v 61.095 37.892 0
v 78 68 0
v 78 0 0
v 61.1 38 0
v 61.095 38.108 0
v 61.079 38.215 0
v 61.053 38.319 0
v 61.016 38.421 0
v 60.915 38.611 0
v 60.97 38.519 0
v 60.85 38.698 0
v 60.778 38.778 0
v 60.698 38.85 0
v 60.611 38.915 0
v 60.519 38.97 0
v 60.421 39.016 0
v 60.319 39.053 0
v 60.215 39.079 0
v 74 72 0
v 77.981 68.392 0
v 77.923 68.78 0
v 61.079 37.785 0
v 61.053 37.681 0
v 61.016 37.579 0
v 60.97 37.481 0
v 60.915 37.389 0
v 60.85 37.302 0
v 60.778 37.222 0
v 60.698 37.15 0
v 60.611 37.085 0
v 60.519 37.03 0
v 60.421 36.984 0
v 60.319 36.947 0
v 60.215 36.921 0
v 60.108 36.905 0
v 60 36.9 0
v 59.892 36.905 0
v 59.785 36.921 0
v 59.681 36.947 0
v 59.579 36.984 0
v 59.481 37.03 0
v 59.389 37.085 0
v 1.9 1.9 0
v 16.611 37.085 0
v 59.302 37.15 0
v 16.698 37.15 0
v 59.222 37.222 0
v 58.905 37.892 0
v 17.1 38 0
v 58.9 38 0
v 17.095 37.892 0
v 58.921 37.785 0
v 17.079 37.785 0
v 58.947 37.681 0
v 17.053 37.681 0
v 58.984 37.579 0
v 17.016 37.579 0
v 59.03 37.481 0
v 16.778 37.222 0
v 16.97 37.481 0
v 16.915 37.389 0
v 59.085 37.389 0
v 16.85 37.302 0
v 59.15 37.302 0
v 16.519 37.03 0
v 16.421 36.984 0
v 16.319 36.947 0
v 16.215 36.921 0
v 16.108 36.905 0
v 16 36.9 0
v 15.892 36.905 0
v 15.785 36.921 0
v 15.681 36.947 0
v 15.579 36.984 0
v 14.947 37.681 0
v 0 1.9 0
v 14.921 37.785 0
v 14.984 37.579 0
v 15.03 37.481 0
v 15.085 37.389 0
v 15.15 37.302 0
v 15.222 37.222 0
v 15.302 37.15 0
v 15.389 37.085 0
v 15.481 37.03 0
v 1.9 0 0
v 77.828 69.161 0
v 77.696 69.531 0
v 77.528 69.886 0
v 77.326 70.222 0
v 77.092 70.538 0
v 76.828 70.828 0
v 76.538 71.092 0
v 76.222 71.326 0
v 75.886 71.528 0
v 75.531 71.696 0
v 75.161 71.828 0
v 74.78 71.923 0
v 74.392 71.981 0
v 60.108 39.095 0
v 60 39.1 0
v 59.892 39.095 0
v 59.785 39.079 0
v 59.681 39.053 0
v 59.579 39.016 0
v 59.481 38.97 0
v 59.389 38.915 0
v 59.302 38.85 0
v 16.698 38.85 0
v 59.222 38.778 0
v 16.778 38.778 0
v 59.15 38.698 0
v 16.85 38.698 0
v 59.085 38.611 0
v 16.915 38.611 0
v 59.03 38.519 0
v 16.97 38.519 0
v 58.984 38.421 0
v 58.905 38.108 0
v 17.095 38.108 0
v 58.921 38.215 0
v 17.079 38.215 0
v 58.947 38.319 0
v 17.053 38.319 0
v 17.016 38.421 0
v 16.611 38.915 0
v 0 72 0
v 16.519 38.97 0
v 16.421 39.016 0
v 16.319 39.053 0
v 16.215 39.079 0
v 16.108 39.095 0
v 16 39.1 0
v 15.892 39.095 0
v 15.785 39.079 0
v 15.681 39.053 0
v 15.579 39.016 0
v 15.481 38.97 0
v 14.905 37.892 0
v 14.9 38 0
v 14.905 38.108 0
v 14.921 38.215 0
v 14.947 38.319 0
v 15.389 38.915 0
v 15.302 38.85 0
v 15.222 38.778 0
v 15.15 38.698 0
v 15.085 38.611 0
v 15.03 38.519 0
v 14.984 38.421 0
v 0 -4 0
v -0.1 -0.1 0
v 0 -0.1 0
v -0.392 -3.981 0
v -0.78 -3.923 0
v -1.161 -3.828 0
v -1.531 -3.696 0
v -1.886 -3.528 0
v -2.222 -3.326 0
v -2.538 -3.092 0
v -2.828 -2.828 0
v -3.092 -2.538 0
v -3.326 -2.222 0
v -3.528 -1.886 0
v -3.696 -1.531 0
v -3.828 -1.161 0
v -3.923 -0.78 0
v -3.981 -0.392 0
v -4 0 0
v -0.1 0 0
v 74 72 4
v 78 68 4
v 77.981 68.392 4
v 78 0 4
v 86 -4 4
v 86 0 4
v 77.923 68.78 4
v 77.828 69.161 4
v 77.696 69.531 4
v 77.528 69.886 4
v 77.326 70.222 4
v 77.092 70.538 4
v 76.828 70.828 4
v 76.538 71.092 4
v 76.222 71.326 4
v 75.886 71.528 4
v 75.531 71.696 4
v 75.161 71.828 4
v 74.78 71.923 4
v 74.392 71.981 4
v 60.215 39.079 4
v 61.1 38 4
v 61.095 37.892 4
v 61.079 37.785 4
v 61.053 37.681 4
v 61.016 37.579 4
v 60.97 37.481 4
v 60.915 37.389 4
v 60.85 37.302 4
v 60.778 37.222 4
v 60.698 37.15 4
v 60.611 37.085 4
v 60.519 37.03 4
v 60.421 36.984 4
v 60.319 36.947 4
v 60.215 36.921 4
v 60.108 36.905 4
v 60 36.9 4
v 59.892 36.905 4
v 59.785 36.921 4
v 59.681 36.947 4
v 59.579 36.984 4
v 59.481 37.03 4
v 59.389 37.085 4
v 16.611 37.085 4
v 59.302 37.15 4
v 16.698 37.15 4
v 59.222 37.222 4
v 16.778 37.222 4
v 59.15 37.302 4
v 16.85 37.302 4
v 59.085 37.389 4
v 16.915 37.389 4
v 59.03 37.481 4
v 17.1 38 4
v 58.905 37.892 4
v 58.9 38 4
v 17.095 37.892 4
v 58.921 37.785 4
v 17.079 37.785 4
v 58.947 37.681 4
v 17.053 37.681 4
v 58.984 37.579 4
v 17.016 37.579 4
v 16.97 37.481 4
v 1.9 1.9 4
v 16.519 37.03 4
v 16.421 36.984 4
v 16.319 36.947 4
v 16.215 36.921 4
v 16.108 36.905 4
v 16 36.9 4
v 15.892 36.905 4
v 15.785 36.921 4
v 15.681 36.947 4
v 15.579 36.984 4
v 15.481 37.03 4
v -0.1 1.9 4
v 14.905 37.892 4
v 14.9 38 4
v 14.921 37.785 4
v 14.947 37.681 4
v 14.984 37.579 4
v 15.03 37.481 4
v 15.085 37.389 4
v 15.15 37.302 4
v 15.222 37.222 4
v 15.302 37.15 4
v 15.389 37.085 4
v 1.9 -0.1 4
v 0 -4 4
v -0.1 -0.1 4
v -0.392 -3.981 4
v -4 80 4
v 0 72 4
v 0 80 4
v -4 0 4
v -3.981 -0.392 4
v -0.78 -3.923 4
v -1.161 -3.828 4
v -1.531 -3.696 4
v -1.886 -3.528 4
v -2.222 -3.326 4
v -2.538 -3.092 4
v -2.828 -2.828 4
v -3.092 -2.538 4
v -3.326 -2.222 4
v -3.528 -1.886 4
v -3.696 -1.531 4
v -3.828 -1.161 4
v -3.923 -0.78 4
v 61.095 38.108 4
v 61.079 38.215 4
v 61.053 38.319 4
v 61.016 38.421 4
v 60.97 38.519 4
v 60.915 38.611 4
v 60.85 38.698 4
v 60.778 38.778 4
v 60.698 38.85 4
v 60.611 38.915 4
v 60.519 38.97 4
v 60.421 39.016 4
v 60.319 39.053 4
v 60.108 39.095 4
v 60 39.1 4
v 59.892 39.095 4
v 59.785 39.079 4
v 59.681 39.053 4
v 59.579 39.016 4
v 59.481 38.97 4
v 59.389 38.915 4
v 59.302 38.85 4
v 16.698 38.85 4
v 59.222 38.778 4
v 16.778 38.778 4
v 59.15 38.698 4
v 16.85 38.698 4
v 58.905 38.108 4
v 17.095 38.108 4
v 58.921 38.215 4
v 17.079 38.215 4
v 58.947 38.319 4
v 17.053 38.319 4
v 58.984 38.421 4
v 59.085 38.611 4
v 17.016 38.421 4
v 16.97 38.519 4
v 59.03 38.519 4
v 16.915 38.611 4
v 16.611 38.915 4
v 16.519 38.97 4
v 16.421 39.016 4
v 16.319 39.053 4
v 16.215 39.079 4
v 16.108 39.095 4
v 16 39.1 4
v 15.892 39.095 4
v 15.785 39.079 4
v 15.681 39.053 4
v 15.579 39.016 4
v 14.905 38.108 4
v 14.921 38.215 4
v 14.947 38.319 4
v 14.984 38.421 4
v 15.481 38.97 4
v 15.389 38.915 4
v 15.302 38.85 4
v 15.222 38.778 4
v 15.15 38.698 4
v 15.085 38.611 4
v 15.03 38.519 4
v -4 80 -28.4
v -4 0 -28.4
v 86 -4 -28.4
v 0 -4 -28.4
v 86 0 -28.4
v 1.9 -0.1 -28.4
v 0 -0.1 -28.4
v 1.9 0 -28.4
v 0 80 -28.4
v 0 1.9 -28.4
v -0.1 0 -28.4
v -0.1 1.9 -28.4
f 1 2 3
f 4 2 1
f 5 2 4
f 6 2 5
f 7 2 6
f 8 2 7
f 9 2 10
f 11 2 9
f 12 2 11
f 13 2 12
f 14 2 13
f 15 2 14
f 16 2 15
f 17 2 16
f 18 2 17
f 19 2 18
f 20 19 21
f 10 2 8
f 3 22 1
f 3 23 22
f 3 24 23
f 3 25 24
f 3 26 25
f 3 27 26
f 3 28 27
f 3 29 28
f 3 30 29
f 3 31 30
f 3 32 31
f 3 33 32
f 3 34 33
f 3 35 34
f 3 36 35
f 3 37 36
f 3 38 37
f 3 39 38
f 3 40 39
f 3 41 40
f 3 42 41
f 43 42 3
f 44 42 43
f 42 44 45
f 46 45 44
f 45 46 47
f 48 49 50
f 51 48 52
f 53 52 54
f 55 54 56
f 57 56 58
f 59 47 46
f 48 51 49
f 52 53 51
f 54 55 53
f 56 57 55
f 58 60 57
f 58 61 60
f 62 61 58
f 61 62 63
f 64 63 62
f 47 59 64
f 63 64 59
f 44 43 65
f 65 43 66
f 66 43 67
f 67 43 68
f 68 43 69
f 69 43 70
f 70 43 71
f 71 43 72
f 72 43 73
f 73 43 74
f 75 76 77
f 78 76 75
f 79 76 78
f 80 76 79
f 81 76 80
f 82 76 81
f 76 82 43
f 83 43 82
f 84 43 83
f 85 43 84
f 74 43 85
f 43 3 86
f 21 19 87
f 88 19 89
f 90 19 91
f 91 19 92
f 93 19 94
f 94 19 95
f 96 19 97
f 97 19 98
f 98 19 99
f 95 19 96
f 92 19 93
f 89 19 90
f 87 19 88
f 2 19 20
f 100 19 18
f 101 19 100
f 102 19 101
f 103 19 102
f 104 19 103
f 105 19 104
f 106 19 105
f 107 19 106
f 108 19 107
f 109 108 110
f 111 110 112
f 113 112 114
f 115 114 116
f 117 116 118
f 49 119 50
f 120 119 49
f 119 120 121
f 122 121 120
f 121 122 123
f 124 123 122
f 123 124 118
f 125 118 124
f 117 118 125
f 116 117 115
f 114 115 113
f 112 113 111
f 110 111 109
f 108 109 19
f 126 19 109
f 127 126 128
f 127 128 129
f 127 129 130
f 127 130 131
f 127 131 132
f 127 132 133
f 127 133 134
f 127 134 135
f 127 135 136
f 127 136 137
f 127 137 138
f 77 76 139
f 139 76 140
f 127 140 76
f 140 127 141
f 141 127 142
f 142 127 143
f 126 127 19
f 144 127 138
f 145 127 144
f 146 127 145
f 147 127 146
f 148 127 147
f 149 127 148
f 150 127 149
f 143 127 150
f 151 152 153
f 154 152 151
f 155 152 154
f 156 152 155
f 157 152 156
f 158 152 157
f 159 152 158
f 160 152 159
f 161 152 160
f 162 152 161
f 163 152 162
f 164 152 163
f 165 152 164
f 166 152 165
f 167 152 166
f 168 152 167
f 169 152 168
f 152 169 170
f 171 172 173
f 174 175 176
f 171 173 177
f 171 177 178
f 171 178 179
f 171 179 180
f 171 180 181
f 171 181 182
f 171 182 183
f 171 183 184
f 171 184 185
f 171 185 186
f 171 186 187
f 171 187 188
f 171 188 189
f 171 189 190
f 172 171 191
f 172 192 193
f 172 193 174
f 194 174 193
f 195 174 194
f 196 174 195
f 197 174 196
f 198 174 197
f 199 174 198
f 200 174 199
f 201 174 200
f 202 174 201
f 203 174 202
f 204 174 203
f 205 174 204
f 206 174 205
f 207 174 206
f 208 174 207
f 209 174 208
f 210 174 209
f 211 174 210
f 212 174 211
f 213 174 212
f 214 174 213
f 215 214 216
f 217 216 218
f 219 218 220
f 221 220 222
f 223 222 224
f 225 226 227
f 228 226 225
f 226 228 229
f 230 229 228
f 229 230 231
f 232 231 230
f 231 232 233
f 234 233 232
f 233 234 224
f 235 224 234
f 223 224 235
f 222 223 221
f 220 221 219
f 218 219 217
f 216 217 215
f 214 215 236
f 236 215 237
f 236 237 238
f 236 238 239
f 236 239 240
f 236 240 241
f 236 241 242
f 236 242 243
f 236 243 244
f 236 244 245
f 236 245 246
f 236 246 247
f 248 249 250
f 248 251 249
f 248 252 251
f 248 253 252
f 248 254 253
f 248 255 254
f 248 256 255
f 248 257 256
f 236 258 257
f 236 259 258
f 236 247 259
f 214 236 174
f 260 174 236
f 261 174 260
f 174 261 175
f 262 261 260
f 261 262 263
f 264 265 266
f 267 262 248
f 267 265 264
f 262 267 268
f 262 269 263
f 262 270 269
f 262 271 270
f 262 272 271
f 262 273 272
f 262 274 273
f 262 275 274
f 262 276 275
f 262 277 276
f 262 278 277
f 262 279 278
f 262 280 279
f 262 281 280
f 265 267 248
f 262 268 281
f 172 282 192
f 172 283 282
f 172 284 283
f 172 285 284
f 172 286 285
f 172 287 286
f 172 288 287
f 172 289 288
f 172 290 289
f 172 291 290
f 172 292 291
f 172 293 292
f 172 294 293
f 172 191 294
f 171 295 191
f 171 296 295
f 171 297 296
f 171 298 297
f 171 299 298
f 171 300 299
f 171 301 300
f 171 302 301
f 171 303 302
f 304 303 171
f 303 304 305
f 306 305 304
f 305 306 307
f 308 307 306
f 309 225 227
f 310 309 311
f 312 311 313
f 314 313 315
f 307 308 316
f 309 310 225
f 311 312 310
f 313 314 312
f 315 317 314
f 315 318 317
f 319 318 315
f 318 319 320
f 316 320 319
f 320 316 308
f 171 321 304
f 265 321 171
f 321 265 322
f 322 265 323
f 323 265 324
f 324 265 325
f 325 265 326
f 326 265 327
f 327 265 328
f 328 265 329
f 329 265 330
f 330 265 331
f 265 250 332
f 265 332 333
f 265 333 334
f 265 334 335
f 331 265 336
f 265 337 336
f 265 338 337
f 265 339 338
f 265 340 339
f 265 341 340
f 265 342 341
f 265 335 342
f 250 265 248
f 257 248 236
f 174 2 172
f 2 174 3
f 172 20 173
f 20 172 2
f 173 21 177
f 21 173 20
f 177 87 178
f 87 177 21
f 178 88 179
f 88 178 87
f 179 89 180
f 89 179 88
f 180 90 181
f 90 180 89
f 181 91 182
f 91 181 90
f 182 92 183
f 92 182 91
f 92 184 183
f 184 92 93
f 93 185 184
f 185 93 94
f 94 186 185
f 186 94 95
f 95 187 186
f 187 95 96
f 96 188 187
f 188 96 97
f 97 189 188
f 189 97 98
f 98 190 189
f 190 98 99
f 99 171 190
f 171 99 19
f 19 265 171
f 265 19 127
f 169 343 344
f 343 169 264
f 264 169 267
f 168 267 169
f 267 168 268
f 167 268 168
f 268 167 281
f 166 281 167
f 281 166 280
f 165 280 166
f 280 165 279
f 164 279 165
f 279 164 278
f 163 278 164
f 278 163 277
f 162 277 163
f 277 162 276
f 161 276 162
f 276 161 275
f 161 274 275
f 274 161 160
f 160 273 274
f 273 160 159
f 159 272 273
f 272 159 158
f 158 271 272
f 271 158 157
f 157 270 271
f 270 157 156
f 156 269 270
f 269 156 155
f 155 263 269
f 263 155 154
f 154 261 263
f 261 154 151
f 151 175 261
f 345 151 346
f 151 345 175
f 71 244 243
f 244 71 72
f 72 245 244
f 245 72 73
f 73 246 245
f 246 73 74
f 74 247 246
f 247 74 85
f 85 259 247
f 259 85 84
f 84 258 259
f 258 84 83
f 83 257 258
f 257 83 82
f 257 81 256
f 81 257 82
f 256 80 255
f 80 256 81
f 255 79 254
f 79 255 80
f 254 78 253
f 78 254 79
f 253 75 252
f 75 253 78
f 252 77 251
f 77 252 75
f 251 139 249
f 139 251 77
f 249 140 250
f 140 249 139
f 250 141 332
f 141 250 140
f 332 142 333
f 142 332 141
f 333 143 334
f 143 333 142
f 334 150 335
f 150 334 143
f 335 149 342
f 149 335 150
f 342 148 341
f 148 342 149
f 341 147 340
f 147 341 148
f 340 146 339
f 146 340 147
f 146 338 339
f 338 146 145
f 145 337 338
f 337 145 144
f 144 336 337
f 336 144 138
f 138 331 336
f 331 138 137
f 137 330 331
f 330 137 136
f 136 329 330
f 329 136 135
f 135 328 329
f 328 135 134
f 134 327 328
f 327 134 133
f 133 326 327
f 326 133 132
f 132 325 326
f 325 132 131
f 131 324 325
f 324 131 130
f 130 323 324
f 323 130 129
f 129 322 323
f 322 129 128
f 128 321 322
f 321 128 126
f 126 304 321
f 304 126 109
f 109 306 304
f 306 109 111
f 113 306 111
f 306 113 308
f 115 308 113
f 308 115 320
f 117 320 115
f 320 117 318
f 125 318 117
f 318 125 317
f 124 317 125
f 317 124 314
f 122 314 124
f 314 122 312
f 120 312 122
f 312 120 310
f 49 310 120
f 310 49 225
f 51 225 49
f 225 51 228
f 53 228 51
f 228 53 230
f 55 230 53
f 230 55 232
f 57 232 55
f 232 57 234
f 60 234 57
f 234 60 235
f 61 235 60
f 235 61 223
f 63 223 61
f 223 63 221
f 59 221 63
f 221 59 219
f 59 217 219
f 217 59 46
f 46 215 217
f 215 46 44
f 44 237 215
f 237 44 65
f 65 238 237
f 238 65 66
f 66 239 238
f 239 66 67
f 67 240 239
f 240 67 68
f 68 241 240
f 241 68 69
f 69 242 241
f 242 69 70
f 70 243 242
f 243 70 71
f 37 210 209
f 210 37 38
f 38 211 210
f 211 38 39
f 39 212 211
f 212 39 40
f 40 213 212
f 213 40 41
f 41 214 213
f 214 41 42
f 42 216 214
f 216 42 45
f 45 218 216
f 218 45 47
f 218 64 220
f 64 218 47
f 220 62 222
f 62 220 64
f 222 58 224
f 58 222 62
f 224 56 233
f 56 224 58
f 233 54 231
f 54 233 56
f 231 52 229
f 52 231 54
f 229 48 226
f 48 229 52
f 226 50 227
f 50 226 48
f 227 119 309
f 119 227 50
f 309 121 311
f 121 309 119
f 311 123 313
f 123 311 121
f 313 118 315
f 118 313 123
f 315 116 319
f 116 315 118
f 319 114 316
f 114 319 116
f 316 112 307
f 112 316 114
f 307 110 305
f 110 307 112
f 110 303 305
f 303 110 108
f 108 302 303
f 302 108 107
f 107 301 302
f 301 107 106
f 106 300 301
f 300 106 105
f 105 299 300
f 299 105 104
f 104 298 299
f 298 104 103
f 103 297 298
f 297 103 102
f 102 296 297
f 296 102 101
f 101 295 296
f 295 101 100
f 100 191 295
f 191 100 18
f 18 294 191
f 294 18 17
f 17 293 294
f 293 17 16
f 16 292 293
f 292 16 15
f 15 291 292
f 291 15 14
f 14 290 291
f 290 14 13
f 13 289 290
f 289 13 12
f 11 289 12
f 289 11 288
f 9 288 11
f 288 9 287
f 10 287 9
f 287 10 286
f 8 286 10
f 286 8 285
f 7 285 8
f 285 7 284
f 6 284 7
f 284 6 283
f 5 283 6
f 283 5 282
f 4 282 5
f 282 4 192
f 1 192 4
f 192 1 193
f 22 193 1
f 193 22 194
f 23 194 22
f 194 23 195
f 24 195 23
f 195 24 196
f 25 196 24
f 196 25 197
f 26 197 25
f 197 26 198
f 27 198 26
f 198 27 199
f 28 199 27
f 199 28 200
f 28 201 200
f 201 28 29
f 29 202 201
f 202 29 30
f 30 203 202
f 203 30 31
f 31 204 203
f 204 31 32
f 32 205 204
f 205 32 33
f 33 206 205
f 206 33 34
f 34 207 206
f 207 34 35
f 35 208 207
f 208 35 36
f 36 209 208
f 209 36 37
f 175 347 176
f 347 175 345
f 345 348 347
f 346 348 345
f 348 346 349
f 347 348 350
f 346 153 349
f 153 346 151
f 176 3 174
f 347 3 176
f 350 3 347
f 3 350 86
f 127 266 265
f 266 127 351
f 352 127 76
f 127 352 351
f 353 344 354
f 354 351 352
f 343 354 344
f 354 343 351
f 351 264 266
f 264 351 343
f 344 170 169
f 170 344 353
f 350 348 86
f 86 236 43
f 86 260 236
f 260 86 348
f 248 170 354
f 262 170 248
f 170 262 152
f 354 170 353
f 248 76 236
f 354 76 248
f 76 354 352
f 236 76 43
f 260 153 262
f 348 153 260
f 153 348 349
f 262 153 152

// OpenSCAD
/*
ESPHome Water Bowl Scale
Corner Hole-Marking Jig v1.0 for a 16 x 11 x 1 inch cutting-board platform

Bracket source used for mounting geometry:
50kg Loadcell Bracket versionF by Patrick Laidlaw (patrick3345)
https://www.thingiverse.com/thing:2624188
CC BY, as preserved in the SmartWaterBowl repository.

Use:
- Put the jig on the UNDERSIDE of one board corner.
- Keep the 82 mm side parallel to a 16 inch edge.
- Push both fences fully against the board.
- Mark through both 2.2 mm guide holes with an awl or transfer punch.
- Rotate the physical jig around the board, always keeping the 82 mm side
  parallel to a 16 inch edge.

The two guide-hole centers are parameterized below so they can be revised after
an actual printed-foot fit check without redesigning the jig.
*/

$fn = 64;

jig_version = "v1.0";

// Board
board_t = 25.4;              // 1 inch
fit_clearance = 0.45;        // each fence-to-board clearance

// Jig body
plate_x = 82.0;              // along the board's 16 inch edge
plate_y = 76.0;              // along the board's 11 inch edge
plate_t = 4.0;
fence_t = 4.0;
fence_drop = board_t + 3.0;
corner_relief = 2.0;

// Hole pattern, corner-local coordinates in mm.
// Hole axis is parallel to the 16 inch board edge.
hole_spacing = 44.0;
foot_center_x = 38.0;
foot_center_y = 38.0;
mark_hole_d = 2.2;
collar_od = 8.0;
collar_h = 0.0;

hole_a = [foot_center_x-hole_spacing/2, foot_center_y];
hole_b = [foot_center_x+hole_spacing/2, foot_center_y];

module rounded_rect_2d(w,h,r) {
    offset(r=r) square([w-2*r,h-2*r]);
}

module plate_2d() {
    difference() {
        rounded_rect_2d(plate_x, plate_y, 4);
        for (p=[hole_a,hole_b]) translate(p) circle(d=mark_hole_d);
    }
}

module jig() {
    difference() {
        union() {
            linear_extrude(plate_t) plate_2d();

            // Fences descend from the underside of the top plate.
            translate([0,-fence_t,-fence_drop])
                cube([plate_x+fence_t, fence_t, fence_drop+plate_t]);
            translate([-fence_t,0,-fence_drop])
                cube([fence_t, plate_y+fence_t, fence_drop+plate_t]);

            // Reinforced marking collars are disabled in v1.0.
            for (p=[hole_a,hole_b])
                translate([p[0],p[1],plate_t])
                    difference() {
                        cylinder(h=collar_h,d=collar_od);
                        translate([0,0,-0.1]) cylinder(h=collar_h+0.2,d=mark_hole_d);
                    }
        }

        // Inside-corner relief so a slightly radiused cutting-board edge does
        // not keep the fences from seating fully.
        translate([-0.1,-0.1,-fence_drop-0.1])
            cube([corner_relief,corner_relief,fence_drop+plate_t+0.2]);
    }
}

jig();
